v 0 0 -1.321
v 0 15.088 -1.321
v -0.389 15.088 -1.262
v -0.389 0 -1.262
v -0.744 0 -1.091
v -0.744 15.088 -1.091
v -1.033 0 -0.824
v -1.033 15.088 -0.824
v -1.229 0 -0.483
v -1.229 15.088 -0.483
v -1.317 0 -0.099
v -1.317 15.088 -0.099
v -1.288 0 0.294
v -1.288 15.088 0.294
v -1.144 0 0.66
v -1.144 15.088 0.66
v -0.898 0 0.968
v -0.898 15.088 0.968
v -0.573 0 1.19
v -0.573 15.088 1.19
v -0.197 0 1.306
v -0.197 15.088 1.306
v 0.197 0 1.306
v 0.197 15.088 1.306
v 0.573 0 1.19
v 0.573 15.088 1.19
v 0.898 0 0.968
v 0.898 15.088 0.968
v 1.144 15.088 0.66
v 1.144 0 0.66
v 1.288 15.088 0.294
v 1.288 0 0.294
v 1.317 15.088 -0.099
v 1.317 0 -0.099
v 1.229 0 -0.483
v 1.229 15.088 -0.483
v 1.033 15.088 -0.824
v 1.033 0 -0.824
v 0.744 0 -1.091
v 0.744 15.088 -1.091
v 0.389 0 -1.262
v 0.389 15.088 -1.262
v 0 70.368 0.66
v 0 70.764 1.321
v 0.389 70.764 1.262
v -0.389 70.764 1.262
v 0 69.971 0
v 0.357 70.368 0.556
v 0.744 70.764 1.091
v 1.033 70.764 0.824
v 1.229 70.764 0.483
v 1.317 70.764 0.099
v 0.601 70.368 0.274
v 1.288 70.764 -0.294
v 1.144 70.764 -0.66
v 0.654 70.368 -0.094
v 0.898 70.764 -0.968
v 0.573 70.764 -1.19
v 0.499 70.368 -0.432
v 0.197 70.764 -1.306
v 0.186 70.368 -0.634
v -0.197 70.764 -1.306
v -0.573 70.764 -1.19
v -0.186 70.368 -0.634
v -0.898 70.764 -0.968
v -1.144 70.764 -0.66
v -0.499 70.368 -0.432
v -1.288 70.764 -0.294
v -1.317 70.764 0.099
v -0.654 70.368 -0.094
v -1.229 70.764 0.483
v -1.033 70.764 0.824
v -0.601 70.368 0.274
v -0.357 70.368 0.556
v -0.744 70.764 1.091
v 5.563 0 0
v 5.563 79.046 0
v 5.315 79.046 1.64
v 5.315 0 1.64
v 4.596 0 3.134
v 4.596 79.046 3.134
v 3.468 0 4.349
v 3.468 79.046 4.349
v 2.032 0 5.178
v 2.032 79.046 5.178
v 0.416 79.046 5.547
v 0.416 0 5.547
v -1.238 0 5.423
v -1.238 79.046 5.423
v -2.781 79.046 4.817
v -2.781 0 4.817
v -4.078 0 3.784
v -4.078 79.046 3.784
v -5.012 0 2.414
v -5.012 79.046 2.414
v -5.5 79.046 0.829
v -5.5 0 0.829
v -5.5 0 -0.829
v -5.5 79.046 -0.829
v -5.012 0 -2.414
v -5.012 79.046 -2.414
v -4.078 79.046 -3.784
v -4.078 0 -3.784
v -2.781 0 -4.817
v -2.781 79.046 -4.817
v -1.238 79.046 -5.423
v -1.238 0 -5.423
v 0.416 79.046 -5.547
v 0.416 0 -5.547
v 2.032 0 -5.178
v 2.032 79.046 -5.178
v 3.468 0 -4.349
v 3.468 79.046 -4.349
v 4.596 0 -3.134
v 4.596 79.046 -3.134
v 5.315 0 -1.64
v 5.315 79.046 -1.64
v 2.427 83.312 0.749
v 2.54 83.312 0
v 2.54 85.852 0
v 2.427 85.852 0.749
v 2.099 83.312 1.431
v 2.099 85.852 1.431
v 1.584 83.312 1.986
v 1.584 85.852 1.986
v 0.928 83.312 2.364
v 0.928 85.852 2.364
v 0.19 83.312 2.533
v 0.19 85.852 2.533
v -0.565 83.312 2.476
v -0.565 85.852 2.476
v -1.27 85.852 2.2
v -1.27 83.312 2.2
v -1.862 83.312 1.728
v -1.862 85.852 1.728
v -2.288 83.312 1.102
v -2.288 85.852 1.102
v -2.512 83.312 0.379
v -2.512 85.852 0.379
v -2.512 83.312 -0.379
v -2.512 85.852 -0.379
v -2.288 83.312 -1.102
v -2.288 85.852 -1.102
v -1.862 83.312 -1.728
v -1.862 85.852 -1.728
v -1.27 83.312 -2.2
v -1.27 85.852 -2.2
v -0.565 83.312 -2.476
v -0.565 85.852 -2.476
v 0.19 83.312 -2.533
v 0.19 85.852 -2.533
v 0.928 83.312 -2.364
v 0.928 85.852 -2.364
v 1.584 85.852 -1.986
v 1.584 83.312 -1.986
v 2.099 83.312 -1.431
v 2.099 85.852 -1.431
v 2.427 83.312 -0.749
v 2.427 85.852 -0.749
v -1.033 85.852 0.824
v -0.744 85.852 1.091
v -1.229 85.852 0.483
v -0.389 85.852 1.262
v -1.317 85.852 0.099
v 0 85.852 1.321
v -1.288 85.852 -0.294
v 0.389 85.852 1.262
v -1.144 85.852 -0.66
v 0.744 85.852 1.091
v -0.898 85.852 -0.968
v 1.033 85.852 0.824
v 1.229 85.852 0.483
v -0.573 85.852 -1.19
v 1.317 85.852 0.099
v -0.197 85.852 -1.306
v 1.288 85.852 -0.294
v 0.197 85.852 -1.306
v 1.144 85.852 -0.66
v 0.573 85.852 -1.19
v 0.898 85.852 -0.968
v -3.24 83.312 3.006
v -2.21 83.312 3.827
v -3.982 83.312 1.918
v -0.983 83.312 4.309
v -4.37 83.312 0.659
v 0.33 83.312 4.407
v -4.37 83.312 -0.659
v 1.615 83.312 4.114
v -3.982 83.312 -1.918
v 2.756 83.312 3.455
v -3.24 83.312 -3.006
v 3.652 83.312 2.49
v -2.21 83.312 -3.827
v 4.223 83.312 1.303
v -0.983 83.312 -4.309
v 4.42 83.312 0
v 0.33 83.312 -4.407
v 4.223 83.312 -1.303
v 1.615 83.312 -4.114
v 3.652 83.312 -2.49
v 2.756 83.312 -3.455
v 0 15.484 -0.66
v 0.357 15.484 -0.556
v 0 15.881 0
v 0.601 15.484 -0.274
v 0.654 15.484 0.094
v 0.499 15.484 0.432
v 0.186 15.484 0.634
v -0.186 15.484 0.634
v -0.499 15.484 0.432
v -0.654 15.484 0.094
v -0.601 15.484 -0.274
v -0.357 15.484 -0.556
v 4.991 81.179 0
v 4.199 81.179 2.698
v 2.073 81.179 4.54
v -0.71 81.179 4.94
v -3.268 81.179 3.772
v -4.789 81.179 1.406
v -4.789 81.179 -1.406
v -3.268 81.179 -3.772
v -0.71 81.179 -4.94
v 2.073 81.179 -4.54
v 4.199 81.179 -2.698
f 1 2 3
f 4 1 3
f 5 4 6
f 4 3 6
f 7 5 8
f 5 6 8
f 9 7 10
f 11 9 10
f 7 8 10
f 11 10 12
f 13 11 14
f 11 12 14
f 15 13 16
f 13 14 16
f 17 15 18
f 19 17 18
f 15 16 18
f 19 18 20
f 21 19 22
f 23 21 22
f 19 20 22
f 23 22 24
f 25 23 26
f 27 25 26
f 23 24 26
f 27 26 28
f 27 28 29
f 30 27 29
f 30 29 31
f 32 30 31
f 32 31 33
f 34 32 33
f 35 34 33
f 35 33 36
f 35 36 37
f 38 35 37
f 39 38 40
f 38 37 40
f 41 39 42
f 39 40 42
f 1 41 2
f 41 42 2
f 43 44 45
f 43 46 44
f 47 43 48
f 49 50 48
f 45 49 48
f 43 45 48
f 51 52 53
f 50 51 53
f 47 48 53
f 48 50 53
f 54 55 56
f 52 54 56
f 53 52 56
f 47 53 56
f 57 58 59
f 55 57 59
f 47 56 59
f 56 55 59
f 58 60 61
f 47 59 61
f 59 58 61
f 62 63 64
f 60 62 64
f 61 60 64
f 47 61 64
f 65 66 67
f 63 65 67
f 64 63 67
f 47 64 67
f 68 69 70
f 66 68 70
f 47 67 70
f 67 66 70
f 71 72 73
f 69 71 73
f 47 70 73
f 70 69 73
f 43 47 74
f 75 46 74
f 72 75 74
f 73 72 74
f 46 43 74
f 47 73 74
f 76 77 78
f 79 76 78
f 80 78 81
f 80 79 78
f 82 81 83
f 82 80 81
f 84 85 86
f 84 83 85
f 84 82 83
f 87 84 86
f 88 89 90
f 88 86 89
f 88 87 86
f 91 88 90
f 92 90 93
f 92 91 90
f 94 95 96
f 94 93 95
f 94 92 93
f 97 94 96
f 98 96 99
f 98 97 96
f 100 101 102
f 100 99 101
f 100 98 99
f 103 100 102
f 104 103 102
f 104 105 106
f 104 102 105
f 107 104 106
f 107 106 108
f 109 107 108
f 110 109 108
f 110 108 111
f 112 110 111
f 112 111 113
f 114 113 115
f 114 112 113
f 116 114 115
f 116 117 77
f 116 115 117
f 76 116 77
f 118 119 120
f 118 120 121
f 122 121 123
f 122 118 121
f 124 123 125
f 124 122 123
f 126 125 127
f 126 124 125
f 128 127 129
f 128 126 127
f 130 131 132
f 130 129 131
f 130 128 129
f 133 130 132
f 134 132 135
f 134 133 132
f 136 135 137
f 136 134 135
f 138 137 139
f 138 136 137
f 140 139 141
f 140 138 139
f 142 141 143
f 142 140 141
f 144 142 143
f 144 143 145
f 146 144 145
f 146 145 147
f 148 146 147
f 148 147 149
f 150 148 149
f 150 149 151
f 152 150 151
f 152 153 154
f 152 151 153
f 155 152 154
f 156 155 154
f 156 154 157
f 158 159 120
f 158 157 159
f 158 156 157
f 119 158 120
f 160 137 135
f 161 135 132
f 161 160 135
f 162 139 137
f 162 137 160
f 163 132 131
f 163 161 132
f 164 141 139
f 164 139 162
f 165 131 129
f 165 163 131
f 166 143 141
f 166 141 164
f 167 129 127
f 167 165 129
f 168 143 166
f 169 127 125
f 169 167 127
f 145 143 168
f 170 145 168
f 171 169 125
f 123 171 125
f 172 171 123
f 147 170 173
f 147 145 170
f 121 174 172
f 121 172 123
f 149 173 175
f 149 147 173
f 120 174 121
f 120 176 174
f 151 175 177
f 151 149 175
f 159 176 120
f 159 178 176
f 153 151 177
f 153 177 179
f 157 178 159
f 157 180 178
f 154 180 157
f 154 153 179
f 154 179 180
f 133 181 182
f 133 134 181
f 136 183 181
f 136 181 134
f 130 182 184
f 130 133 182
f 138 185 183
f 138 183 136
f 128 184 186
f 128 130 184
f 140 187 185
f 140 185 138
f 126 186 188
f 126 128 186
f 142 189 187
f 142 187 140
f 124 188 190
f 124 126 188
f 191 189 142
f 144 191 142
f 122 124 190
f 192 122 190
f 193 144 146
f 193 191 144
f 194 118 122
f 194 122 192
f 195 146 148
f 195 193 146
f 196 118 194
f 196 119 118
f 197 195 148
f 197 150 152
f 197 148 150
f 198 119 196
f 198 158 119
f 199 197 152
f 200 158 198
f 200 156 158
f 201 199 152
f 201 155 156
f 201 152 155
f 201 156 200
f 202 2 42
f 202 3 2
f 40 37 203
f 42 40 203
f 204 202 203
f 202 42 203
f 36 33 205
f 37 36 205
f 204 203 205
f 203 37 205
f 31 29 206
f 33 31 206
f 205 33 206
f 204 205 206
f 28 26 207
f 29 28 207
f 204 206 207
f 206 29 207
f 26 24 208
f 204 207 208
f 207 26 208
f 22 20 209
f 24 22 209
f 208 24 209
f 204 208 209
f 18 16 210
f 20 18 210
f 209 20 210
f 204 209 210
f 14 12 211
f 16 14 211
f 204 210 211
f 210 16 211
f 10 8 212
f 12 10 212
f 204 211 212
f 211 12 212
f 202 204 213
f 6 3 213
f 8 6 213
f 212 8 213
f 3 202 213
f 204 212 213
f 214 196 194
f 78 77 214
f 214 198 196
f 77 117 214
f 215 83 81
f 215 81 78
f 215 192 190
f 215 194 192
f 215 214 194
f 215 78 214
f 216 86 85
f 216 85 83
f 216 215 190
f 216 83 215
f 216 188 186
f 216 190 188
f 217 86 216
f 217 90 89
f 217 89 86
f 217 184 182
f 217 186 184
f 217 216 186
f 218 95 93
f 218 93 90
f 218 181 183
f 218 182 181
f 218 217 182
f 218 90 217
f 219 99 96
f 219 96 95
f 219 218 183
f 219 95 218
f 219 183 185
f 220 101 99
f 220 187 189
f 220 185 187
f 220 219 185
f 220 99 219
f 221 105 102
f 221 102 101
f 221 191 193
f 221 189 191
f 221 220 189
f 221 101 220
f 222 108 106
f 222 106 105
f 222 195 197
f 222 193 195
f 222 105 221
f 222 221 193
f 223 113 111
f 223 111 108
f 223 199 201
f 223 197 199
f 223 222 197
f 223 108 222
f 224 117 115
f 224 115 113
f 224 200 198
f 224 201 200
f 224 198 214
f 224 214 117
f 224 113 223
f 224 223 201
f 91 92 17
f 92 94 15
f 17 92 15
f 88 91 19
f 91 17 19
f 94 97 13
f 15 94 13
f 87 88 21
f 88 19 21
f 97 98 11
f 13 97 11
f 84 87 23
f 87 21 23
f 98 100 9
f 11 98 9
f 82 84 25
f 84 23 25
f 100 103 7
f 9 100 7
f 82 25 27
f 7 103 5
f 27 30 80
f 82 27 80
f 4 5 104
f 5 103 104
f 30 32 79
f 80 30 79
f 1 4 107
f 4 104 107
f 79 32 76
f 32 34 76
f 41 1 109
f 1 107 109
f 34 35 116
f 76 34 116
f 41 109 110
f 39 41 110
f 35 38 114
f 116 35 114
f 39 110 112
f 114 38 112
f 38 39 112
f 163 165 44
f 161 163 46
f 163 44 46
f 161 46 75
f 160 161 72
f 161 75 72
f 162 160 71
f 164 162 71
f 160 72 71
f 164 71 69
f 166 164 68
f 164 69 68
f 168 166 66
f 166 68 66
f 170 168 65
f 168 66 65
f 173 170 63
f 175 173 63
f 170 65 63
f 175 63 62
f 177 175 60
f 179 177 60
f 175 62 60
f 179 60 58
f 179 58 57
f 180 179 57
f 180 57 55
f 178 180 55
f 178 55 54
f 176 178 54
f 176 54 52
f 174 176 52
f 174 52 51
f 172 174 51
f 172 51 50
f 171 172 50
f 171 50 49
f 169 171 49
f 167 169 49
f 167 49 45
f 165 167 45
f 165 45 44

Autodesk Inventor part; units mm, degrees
ref_plane "YZ Plane" through (0, 0, 0) normal (1, 0, 0) x (0, 1, 0)
ref_plane "XZ Plane" through (0, 0, 0) normal (0, 1, 0) x (-1, 0, 0)
ref_plane "XY Plane" through (0, 0, 0) normal (0, 0, 1) x (1, 0, 0)
sketch "Sketch1" plane through (0, 0, 0) normal (0, 0, 1) x (1, 0, 0)
  line L0 (0, 0) -> (0, 85.852)
  line L1 (0, 85.852) -> (2.54, 85.852)
  line L2 (2.54, 85.852) -> (2.54, 83.312)
  line L3 (5.5626, 79.0463) -> (5.5626, 0)
  line L4 (5.5626, 0) -> (0, 0)
  line L5 (2.54, 83.312) -> (4.4196, 83.312)
  line L6 (4.4196, 83.312) -> (5.5626, 79.0463)
  dimension "d0" = 83.312
  dimension "d1" = 2.54
  dimension "d2" = 75
  dimension "d3" = 1.143
  dimension "d4" = 5.5626
  dimension "d5" = 2.54
revolve "Revolution1" add sketch "Sketch1" angle 360 about axis through (0, 0, 0) along (0, 1, 0)
hole "Hole1" at (0, 0, 0) direction (0, 1, 0) diameter 2.6416 depth 15.0876 tip angle 118 thread size "6-32 UNC" class "2B" standard "ANSI Unified Screw Threads"
hole "Hole2" at (0, 85.852, 0) direction (0, -1, 0) diameter 2.6416 depth 15.0876 tip angle 118 thread size "6-32 UNC" class "2B" standard "ANSI Unified Screw Threads"
properties part number "kinect standoff" material "Aluminum-6061"
